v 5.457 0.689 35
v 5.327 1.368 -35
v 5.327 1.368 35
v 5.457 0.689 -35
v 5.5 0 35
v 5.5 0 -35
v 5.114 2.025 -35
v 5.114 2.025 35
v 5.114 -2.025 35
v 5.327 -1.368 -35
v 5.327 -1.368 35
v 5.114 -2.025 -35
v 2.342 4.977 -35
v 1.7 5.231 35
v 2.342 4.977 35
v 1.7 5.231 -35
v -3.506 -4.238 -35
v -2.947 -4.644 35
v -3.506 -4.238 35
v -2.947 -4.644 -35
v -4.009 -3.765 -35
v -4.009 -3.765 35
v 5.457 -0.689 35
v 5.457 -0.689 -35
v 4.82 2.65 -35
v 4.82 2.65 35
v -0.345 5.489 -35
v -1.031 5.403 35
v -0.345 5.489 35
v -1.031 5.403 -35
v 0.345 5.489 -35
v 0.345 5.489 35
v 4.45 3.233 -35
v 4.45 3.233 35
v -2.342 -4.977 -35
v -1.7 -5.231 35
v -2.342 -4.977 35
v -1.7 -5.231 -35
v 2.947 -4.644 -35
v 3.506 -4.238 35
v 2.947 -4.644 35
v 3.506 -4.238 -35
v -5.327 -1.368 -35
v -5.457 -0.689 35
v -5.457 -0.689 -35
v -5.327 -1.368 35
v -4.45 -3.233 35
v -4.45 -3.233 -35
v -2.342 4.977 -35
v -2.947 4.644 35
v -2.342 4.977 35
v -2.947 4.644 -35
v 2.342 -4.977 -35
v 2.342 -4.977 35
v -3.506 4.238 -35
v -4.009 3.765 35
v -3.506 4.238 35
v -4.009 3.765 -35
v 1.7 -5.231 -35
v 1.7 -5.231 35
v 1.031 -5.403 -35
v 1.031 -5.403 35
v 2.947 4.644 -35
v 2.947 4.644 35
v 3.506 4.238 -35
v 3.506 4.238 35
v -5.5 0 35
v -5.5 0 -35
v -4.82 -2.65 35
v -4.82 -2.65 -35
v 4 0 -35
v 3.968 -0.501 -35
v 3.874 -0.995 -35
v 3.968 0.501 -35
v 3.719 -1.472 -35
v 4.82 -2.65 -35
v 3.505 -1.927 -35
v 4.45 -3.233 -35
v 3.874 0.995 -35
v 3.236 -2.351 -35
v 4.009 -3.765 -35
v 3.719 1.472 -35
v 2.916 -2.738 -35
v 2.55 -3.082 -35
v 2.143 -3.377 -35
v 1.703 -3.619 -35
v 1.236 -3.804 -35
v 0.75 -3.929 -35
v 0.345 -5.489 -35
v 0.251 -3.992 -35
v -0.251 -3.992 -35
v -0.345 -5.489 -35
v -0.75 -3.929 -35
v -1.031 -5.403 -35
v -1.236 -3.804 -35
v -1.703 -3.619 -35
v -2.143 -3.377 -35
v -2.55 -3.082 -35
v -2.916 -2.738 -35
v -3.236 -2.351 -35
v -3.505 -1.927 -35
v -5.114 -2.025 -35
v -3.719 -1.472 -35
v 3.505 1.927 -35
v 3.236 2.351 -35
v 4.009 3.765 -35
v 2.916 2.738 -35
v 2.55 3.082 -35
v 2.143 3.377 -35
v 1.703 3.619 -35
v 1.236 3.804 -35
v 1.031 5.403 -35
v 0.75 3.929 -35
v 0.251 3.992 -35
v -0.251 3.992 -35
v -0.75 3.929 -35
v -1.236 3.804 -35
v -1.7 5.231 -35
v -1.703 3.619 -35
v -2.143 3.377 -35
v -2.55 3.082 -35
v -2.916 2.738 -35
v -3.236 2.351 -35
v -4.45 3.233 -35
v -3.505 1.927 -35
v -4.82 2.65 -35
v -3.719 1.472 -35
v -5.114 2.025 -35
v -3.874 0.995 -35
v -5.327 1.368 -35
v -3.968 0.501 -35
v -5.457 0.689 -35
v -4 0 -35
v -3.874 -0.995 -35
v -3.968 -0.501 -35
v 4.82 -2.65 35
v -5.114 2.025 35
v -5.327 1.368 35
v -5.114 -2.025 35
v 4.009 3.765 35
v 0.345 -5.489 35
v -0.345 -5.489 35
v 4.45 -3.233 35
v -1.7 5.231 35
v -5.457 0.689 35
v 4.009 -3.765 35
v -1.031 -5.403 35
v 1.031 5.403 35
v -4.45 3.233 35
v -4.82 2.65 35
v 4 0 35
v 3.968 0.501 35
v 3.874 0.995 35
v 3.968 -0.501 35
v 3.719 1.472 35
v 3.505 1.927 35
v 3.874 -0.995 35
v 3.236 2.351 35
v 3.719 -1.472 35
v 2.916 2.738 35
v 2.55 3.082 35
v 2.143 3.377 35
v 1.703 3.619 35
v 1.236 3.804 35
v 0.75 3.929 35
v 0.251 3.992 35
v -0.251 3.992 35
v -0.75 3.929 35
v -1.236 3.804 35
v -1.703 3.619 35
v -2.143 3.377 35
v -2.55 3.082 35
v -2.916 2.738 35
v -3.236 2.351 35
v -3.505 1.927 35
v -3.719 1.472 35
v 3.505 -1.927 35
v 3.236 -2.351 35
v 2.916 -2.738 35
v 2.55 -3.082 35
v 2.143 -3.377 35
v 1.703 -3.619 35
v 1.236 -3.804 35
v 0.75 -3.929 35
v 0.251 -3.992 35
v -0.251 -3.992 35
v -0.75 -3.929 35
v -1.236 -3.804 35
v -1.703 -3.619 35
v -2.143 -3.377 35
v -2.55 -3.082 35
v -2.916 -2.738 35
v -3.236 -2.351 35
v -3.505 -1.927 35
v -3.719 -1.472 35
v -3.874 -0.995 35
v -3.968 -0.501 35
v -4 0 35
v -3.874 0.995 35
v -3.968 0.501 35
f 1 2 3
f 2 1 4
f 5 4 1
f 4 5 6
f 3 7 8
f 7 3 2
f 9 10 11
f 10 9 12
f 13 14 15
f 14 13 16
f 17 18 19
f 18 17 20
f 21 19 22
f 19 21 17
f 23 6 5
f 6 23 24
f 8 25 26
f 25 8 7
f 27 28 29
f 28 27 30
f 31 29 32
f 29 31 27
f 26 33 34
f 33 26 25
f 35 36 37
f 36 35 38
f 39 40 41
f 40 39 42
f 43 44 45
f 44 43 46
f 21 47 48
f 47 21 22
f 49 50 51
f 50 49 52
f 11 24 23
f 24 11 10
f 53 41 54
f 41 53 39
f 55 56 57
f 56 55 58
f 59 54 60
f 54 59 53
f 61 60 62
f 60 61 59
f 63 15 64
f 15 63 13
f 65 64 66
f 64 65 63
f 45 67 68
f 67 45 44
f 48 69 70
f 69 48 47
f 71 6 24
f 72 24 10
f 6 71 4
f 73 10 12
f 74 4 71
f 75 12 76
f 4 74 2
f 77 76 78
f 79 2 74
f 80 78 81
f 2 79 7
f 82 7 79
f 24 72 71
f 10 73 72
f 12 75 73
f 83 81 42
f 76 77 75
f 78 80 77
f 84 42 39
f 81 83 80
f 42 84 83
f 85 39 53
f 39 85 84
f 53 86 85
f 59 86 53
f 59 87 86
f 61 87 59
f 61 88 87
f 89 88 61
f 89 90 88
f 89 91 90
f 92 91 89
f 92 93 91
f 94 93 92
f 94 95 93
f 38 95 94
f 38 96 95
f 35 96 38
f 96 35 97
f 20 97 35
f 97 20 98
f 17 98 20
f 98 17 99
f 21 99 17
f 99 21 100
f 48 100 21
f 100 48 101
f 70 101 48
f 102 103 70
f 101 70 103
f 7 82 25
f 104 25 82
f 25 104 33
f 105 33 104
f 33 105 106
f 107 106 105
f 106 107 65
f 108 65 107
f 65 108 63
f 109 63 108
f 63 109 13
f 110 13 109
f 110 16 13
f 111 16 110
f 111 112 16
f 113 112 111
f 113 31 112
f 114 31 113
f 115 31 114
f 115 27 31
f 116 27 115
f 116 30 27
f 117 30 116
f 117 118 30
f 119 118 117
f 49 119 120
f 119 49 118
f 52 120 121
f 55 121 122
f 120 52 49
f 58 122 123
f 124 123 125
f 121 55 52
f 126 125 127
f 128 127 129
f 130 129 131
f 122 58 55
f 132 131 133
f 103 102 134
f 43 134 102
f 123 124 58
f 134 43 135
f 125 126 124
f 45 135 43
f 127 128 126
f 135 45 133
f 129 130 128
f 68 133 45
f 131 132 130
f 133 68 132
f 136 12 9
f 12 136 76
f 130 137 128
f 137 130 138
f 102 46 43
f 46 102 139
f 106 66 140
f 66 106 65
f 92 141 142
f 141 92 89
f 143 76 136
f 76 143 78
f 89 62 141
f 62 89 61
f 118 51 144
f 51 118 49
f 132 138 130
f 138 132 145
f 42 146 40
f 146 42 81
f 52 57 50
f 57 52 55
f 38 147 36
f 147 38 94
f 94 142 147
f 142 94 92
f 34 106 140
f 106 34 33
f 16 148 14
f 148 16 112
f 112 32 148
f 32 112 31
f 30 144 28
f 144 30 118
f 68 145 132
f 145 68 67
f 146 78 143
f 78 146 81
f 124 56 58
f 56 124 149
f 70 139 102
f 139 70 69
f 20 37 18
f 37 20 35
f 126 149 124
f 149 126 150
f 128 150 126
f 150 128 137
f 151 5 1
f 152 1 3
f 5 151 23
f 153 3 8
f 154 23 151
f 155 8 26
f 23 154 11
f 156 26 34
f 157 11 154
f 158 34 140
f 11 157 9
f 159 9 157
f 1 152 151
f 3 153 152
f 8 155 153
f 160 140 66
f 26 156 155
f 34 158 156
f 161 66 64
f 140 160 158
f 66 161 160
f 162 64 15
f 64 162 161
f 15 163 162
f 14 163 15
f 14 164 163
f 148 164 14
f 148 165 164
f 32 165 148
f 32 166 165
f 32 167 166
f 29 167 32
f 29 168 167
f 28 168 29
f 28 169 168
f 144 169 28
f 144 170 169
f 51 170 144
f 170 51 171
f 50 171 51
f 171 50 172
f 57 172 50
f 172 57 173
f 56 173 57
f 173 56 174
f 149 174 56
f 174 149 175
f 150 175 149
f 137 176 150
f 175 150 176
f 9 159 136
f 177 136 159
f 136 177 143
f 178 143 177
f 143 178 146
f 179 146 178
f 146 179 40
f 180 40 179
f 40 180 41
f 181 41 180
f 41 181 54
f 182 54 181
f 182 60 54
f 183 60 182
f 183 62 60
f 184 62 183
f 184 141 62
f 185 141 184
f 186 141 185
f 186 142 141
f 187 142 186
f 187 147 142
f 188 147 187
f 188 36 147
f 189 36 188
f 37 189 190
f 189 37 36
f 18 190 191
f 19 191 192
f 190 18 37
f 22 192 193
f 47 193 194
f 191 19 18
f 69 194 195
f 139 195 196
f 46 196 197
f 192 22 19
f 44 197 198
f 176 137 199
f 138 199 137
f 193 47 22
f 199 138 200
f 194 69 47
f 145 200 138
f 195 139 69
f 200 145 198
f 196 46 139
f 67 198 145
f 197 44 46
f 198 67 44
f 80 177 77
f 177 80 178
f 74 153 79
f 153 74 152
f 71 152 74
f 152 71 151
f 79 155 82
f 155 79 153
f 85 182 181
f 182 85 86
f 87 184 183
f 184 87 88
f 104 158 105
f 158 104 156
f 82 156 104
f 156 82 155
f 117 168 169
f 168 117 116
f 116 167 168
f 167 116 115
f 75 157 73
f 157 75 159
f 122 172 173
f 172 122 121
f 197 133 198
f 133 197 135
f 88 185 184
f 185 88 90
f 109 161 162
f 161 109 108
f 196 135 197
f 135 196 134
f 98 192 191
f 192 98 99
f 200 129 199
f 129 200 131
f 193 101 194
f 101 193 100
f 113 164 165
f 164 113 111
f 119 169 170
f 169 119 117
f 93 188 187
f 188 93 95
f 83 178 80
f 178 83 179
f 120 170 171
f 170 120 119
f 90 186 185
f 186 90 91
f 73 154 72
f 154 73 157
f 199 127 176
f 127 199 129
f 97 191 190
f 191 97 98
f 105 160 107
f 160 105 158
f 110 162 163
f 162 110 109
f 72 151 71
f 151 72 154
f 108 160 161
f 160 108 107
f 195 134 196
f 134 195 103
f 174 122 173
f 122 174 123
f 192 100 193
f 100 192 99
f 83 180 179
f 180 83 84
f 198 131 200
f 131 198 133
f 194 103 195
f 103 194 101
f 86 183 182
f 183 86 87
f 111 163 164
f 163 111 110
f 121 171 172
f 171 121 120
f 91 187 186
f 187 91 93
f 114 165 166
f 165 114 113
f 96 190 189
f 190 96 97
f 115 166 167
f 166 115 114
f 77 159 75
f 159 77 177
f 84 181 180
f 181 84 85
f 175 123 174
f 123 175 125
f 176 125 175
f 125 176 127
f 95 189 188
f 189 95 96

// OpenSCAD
$fn = 50;


difference() {
	union() {
		translate(v = [0, 0, -35.0000000000]) {
			cylinder(h = 70, r = 5.5000000000);
		}
	}
	union() {
		translate(v = [0, 0, -100.0000000000]) {
			cylinder(h = 200, r = 4.0000000000);
		}
	}
}
